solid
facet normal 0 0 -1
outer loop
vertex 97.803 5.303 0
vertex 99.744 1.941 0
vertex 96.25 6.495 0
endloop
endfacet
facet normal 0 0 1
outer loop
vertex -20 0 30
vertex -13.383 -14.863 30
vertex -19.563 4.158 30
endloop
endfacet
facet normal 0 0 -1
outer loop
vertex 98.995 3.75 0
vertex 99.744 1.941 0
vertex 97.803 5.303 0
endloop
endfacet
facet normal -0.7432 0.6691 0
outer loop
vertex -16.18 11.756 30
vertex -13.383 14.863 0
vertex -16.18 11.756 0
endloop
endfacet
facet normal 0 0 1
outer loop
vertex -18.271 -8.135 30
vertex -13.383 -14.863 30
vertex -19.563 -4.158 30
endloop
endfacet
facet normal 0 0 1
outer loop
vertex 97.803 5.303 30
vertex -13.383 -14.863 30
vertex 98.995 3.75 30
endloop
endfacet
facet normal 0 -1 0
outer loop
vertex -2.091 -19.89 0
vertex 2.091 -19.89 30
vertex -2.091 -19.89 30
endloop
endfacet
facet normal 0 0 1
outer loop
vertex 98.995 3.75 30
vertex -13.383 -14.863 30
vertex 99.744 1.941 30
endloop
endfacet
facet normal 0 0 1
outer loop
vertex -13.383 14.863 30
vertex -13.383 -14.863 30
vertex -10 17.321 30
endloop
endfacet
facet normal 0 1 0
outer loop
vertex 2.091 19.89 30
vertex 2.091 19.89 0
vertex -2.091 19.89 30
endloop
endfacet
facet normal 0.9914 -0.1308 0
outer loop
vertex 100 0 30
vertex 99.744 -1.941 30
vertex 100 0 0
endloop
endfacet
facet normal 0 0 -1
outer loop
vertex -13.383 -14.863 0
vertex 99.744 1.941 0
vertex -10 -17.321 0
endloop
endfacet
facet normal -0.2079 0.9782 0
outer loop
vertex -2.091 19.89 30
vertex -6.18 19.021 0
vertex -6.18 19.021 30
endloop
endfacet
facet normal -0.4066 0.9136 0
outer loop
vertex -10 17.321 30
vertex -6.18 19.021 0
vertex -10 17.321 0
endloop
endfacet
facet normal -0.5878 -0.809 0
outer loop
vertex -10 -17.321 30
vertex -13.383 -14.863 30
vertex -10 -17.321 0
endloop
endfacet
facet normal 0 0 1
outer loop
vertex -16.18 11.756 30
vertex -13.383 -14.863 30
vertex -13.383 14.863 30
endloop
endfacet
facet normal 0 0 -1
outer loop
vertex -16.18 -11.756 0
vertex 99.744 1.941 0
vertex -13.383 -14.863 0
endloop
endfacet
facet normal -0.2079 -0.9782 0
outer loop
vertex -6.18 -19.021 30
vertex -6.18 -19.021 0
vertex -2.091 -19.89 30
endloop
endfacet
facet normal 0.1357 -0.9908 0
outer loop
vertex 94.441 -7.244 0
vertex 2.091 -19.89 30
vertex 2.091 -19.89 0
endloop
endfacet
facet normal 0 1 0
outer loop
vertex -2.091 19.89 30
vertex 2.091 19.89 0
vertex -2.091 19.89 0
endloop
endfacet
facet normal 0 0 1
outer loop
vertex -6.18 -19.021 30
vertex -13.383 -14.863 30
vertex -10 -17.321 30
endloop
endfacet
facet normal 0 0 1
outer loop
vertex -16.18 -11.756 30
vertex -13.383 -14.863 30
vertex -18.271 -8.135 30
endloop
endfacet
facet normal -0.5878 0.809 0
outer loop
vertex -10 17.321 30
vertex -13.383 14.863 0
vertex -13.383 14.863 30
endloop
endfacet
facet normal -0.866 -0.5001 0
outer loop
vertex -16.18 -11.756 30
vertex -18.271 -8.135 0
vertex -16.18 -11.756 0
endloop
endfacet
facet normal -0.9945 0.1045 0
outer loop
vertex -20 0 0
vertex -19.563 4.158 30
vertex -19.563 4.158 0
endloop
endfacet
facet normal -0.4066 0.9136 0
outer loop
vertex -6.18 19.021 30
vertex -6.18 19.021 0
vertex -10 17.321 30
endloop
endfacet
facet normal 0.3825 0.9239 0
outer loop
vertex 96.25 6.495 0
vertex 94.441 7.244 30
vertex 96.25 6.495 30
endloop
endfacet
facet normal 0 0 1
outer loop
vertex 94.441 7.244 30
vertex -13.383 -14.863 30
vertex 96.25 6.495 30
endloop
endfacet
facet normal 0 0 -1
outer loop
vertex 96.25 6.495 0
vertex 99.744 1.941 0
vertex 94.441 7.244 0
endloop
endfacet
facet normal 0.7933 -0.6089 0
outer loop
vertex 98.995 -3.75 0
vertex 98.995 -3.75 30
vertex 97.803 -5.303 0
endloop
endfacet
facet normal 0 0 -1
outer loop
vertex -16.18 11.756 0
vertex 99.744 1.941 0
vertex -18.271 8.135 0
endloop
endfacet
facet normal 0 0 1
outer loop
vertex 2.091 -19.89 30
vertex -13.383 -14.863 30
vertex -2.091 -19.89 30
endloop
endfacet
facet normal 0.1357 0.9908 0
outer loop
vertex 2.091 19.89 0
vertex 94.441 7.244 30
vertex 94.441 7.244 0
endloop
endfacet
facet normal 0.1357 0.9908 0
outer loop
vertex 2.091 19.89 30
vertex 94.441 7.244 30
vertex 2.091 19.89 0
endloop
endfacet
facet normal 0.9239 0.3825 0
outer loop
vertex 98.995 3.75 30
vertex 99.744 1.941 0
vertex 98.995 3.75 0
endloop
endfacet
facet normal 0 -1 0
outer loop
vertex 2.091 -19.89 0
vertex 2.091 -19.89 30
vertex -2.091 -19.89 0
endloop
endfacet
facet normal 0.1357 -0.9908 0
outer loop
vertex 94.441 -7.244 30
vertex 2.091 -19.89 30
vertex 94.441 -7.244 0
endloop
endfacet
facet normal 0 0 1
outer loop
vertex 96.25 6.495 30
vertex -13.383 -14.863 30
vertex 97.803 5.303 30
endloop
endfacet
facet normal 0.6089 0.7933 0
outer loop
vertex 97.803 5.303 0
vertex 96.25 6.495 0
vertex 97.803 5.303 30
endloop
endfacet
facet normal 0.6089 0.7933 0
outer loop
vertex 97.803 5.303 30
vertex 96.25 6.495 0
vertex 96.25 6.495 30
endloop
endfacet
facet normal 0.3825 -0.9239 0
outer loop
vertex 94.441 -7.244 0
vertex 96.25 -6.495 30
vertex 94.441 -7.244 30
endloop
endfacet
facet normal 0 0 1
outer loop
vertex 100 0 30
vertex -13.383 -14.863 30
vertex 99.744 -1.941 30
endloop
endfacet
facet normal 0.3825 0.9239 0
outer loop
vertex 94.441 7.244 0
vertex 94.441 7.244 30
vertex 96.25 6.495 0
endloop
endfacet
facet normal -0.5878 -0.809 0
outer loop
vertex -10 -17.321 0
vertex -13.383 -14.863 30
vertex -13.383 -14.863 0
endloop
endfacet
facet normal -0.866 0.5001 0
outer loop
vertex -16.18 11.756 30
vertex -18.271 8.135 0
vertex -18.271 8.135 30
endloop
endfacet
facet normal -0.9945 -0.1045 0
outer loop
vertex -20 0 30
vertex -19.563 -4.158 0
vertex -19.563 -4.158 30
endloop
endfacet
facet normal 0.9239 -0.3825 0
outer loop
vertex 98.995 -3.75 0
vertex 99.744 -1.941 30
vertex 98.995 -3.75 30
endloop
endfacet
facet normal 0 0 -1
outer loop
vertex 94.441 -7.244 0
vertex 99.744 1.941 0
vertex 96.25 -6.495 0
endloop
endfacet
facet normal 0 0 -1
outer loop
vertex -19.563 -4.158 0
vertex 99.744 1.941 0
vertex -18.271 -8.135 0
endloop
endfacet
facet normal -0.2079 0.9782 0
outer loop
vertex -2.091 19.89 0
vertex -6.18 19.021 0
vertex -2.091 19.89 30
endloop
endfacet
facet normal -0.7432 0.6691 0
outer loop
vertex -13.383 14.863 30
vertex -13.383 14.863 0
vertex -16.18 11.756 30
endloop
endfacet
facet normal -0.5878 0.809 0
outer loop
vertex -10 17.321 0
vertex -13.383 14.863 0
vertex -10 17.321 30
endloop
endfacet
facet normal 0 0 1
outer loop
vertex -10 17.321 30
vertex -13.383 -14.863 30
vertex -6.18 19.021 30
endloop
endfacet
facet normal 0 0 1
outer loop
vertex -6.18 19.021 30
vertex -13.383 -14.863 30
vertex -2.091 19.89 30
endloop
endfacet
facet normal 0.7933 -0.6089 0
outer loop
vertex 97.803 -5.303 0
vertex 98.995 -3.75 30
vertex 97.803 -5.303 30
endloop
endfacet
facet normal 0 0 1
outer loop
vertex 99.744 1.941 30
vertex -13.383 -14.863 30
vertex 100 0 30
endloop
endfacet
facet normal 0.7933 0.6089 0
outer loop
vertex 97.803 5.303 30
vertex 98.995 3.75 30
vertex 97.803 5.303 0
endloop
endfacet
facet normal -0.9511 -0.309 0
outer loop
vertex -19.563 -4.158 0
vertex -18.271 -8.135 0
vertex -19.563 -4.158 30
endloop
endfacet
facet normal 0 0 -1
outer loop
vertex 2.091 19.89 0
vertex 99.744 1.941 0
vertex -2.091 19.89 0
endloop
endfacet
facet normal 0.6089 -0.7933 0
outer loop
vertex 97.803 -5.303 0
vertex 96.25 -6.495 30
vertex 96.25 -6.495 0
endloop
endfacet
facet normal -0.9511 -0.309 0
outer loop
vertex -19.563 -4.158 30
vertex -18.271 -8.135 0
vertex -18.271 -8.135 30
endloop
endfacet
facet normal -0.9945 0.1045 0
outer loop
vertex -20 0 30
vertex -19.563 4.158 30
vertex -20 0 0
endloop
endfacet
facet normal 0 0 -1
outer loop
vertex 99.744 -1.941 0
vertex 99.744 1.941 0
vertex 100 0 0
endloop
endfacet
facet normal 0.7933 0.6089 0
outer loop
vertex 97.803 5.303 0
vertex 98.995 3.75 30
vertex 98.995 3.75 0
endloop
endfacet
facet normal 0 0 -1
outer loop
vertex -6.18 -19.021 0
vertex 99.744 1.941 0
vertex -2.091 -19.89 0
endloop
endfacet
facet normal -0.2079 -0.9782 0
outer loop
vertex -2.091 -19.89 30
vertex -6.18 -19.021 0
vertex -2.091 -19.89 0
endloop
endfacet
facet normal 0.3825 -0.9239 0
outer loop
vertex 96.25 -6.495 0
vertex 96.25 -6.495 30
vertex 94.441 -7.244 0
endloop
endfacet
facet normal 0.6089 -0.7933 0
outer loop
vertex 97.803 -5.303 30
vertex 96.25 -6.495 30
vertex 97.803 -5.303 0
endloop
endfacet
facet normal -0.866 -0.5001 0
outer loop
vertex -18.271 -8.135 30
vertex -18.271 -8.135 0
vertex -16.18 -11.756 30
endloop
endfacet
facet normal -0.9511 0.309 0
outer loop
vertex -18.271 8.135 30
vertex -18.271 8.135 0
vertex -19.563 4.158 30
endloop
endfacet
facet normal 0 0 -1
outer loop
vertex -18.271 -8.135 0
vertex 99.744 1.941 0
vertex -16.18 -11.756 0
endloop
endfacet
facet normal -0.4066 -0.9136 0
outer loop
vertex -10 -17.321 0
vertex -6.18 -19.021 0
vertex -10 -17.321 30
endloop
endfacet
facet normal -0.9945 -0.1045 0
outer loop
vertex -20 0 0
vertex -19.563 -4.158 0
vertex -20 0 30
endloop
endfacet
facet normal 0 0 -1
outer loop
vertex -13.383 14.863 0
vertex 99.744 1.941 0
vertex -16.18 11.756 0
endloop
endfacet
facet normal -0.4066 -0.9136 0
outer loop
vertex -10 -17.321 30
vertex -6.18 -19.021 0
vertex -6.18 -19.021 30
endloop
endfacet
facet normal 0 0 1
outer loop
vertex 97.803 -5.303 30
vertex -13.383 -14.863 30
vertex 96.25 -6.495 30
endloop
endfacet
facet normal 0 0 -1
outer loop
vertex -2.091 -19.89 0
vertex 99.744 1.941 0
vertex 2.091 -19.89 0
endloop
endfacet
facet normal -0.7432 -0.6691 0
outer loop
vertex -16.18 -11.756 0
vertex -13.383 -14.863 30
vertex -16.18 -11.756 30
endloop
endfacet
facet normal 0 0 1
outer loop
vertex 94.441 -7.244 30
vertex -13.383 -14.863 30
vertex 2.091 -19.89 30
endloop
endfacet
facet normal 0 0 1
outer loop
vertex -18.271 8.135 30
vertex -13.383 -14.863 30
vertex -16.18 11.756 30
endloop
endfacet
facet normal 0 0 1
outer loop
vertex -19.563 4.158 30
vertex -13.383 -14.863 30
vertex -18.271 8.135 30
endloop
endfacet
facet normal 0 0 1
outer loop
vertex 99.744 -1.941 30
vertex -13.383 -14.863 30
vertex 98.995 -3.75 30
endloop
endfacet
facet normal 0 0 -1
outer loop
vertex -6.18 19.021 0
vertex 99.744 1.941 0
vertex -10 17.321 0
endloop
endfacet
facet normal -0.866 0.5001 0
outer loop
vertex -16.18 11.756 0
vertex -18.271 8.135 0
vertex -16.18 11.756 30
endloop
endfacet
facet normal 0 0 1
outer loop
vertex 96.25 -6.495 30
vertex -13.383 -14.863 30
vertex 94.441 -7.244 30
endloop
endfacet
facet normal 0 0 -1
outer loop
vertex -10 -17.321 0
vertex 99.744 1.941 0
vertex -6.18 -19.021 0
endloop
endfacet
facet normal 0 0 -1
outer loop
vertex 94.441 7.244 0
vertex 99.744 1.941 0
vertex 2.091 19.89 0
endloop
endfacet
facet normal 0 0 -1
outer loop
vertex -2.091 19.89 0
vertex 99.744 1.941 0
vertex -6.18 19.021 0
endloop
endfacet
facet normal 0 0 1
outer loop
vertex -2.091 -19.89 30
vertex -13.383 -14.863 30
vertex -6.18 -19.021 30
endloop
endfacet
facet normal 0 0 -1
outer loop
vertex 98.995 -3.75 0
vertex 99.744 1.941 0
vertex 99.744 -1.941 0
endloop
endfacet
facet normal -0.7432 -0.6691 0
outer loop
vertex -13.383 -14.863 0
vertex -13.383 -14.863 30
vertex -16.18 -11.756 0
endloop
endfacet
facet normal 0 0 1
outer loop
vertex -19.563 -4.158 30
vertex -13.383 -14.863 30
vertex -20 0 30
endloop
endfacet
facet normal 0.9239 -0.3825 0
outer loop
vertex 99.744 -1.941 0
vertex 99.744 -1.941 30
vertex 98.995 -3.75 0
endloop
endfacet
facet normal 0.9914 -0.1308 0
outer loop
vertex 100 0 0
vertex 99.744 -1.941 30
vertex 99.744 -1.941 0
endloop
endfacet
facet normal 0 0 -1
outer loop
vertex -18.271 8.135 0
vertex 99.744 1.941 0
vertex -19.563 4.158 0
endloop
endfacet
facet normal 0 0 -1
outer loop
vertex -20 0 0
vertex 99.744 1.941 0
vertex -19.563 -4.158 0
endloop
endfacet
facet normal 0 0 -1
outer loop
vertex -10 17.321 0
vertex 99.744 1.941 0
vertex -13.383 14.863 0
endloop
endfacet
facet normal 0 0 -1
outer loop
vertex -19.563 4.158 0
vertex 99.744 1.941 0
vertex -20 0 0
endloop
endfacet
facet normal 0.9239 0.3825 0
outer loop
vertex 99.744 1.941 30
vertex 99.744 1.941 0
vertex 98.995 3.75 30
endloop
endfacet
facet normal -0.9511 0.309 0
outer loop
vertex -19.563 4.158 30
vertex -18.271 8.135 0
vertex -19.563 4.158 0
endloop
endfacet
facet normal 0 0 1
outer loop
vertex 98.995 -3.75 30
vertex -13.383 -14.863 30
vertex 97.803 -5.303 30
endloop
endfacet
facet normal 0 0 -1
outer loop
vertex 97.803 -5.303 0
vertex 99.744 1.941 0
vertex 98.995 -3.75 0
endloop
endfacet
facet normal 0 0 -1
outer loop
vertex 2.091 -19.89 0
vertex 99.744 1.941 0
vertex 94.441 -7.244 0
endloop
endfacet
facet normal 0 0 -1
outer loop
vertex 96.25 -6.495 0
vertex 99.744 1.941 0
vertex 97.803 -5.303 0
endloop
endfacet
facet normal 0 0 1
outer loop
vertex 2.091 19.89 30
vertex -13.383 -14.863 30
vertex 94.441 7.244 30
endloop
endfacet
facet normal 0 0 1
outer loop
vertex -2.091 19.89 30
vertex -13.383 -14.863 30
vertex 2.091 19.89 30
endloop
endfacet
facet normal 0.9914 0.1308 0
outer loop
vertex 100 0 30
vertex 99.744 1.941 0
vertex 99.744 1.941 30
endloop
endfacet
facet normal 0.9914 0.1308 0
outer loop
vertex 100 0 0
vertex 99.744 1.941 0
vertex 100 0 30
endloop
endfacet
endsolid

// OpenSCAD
//Physically bound settings.
hexkey_radius = 3;

//Preference settings.
length = 100; //Distance between rotation point and tip of flipper.
big_radius = 20;
small_radius = 7.5;
height = 30;

module body() {
	hull() {
		cylinder(r=big_radius, h=height);
		translate([length - small_radius, 0, 0]) {
			cylinder(r=small_radius, h=height);
		}
	}
}

//Debug.
body();
